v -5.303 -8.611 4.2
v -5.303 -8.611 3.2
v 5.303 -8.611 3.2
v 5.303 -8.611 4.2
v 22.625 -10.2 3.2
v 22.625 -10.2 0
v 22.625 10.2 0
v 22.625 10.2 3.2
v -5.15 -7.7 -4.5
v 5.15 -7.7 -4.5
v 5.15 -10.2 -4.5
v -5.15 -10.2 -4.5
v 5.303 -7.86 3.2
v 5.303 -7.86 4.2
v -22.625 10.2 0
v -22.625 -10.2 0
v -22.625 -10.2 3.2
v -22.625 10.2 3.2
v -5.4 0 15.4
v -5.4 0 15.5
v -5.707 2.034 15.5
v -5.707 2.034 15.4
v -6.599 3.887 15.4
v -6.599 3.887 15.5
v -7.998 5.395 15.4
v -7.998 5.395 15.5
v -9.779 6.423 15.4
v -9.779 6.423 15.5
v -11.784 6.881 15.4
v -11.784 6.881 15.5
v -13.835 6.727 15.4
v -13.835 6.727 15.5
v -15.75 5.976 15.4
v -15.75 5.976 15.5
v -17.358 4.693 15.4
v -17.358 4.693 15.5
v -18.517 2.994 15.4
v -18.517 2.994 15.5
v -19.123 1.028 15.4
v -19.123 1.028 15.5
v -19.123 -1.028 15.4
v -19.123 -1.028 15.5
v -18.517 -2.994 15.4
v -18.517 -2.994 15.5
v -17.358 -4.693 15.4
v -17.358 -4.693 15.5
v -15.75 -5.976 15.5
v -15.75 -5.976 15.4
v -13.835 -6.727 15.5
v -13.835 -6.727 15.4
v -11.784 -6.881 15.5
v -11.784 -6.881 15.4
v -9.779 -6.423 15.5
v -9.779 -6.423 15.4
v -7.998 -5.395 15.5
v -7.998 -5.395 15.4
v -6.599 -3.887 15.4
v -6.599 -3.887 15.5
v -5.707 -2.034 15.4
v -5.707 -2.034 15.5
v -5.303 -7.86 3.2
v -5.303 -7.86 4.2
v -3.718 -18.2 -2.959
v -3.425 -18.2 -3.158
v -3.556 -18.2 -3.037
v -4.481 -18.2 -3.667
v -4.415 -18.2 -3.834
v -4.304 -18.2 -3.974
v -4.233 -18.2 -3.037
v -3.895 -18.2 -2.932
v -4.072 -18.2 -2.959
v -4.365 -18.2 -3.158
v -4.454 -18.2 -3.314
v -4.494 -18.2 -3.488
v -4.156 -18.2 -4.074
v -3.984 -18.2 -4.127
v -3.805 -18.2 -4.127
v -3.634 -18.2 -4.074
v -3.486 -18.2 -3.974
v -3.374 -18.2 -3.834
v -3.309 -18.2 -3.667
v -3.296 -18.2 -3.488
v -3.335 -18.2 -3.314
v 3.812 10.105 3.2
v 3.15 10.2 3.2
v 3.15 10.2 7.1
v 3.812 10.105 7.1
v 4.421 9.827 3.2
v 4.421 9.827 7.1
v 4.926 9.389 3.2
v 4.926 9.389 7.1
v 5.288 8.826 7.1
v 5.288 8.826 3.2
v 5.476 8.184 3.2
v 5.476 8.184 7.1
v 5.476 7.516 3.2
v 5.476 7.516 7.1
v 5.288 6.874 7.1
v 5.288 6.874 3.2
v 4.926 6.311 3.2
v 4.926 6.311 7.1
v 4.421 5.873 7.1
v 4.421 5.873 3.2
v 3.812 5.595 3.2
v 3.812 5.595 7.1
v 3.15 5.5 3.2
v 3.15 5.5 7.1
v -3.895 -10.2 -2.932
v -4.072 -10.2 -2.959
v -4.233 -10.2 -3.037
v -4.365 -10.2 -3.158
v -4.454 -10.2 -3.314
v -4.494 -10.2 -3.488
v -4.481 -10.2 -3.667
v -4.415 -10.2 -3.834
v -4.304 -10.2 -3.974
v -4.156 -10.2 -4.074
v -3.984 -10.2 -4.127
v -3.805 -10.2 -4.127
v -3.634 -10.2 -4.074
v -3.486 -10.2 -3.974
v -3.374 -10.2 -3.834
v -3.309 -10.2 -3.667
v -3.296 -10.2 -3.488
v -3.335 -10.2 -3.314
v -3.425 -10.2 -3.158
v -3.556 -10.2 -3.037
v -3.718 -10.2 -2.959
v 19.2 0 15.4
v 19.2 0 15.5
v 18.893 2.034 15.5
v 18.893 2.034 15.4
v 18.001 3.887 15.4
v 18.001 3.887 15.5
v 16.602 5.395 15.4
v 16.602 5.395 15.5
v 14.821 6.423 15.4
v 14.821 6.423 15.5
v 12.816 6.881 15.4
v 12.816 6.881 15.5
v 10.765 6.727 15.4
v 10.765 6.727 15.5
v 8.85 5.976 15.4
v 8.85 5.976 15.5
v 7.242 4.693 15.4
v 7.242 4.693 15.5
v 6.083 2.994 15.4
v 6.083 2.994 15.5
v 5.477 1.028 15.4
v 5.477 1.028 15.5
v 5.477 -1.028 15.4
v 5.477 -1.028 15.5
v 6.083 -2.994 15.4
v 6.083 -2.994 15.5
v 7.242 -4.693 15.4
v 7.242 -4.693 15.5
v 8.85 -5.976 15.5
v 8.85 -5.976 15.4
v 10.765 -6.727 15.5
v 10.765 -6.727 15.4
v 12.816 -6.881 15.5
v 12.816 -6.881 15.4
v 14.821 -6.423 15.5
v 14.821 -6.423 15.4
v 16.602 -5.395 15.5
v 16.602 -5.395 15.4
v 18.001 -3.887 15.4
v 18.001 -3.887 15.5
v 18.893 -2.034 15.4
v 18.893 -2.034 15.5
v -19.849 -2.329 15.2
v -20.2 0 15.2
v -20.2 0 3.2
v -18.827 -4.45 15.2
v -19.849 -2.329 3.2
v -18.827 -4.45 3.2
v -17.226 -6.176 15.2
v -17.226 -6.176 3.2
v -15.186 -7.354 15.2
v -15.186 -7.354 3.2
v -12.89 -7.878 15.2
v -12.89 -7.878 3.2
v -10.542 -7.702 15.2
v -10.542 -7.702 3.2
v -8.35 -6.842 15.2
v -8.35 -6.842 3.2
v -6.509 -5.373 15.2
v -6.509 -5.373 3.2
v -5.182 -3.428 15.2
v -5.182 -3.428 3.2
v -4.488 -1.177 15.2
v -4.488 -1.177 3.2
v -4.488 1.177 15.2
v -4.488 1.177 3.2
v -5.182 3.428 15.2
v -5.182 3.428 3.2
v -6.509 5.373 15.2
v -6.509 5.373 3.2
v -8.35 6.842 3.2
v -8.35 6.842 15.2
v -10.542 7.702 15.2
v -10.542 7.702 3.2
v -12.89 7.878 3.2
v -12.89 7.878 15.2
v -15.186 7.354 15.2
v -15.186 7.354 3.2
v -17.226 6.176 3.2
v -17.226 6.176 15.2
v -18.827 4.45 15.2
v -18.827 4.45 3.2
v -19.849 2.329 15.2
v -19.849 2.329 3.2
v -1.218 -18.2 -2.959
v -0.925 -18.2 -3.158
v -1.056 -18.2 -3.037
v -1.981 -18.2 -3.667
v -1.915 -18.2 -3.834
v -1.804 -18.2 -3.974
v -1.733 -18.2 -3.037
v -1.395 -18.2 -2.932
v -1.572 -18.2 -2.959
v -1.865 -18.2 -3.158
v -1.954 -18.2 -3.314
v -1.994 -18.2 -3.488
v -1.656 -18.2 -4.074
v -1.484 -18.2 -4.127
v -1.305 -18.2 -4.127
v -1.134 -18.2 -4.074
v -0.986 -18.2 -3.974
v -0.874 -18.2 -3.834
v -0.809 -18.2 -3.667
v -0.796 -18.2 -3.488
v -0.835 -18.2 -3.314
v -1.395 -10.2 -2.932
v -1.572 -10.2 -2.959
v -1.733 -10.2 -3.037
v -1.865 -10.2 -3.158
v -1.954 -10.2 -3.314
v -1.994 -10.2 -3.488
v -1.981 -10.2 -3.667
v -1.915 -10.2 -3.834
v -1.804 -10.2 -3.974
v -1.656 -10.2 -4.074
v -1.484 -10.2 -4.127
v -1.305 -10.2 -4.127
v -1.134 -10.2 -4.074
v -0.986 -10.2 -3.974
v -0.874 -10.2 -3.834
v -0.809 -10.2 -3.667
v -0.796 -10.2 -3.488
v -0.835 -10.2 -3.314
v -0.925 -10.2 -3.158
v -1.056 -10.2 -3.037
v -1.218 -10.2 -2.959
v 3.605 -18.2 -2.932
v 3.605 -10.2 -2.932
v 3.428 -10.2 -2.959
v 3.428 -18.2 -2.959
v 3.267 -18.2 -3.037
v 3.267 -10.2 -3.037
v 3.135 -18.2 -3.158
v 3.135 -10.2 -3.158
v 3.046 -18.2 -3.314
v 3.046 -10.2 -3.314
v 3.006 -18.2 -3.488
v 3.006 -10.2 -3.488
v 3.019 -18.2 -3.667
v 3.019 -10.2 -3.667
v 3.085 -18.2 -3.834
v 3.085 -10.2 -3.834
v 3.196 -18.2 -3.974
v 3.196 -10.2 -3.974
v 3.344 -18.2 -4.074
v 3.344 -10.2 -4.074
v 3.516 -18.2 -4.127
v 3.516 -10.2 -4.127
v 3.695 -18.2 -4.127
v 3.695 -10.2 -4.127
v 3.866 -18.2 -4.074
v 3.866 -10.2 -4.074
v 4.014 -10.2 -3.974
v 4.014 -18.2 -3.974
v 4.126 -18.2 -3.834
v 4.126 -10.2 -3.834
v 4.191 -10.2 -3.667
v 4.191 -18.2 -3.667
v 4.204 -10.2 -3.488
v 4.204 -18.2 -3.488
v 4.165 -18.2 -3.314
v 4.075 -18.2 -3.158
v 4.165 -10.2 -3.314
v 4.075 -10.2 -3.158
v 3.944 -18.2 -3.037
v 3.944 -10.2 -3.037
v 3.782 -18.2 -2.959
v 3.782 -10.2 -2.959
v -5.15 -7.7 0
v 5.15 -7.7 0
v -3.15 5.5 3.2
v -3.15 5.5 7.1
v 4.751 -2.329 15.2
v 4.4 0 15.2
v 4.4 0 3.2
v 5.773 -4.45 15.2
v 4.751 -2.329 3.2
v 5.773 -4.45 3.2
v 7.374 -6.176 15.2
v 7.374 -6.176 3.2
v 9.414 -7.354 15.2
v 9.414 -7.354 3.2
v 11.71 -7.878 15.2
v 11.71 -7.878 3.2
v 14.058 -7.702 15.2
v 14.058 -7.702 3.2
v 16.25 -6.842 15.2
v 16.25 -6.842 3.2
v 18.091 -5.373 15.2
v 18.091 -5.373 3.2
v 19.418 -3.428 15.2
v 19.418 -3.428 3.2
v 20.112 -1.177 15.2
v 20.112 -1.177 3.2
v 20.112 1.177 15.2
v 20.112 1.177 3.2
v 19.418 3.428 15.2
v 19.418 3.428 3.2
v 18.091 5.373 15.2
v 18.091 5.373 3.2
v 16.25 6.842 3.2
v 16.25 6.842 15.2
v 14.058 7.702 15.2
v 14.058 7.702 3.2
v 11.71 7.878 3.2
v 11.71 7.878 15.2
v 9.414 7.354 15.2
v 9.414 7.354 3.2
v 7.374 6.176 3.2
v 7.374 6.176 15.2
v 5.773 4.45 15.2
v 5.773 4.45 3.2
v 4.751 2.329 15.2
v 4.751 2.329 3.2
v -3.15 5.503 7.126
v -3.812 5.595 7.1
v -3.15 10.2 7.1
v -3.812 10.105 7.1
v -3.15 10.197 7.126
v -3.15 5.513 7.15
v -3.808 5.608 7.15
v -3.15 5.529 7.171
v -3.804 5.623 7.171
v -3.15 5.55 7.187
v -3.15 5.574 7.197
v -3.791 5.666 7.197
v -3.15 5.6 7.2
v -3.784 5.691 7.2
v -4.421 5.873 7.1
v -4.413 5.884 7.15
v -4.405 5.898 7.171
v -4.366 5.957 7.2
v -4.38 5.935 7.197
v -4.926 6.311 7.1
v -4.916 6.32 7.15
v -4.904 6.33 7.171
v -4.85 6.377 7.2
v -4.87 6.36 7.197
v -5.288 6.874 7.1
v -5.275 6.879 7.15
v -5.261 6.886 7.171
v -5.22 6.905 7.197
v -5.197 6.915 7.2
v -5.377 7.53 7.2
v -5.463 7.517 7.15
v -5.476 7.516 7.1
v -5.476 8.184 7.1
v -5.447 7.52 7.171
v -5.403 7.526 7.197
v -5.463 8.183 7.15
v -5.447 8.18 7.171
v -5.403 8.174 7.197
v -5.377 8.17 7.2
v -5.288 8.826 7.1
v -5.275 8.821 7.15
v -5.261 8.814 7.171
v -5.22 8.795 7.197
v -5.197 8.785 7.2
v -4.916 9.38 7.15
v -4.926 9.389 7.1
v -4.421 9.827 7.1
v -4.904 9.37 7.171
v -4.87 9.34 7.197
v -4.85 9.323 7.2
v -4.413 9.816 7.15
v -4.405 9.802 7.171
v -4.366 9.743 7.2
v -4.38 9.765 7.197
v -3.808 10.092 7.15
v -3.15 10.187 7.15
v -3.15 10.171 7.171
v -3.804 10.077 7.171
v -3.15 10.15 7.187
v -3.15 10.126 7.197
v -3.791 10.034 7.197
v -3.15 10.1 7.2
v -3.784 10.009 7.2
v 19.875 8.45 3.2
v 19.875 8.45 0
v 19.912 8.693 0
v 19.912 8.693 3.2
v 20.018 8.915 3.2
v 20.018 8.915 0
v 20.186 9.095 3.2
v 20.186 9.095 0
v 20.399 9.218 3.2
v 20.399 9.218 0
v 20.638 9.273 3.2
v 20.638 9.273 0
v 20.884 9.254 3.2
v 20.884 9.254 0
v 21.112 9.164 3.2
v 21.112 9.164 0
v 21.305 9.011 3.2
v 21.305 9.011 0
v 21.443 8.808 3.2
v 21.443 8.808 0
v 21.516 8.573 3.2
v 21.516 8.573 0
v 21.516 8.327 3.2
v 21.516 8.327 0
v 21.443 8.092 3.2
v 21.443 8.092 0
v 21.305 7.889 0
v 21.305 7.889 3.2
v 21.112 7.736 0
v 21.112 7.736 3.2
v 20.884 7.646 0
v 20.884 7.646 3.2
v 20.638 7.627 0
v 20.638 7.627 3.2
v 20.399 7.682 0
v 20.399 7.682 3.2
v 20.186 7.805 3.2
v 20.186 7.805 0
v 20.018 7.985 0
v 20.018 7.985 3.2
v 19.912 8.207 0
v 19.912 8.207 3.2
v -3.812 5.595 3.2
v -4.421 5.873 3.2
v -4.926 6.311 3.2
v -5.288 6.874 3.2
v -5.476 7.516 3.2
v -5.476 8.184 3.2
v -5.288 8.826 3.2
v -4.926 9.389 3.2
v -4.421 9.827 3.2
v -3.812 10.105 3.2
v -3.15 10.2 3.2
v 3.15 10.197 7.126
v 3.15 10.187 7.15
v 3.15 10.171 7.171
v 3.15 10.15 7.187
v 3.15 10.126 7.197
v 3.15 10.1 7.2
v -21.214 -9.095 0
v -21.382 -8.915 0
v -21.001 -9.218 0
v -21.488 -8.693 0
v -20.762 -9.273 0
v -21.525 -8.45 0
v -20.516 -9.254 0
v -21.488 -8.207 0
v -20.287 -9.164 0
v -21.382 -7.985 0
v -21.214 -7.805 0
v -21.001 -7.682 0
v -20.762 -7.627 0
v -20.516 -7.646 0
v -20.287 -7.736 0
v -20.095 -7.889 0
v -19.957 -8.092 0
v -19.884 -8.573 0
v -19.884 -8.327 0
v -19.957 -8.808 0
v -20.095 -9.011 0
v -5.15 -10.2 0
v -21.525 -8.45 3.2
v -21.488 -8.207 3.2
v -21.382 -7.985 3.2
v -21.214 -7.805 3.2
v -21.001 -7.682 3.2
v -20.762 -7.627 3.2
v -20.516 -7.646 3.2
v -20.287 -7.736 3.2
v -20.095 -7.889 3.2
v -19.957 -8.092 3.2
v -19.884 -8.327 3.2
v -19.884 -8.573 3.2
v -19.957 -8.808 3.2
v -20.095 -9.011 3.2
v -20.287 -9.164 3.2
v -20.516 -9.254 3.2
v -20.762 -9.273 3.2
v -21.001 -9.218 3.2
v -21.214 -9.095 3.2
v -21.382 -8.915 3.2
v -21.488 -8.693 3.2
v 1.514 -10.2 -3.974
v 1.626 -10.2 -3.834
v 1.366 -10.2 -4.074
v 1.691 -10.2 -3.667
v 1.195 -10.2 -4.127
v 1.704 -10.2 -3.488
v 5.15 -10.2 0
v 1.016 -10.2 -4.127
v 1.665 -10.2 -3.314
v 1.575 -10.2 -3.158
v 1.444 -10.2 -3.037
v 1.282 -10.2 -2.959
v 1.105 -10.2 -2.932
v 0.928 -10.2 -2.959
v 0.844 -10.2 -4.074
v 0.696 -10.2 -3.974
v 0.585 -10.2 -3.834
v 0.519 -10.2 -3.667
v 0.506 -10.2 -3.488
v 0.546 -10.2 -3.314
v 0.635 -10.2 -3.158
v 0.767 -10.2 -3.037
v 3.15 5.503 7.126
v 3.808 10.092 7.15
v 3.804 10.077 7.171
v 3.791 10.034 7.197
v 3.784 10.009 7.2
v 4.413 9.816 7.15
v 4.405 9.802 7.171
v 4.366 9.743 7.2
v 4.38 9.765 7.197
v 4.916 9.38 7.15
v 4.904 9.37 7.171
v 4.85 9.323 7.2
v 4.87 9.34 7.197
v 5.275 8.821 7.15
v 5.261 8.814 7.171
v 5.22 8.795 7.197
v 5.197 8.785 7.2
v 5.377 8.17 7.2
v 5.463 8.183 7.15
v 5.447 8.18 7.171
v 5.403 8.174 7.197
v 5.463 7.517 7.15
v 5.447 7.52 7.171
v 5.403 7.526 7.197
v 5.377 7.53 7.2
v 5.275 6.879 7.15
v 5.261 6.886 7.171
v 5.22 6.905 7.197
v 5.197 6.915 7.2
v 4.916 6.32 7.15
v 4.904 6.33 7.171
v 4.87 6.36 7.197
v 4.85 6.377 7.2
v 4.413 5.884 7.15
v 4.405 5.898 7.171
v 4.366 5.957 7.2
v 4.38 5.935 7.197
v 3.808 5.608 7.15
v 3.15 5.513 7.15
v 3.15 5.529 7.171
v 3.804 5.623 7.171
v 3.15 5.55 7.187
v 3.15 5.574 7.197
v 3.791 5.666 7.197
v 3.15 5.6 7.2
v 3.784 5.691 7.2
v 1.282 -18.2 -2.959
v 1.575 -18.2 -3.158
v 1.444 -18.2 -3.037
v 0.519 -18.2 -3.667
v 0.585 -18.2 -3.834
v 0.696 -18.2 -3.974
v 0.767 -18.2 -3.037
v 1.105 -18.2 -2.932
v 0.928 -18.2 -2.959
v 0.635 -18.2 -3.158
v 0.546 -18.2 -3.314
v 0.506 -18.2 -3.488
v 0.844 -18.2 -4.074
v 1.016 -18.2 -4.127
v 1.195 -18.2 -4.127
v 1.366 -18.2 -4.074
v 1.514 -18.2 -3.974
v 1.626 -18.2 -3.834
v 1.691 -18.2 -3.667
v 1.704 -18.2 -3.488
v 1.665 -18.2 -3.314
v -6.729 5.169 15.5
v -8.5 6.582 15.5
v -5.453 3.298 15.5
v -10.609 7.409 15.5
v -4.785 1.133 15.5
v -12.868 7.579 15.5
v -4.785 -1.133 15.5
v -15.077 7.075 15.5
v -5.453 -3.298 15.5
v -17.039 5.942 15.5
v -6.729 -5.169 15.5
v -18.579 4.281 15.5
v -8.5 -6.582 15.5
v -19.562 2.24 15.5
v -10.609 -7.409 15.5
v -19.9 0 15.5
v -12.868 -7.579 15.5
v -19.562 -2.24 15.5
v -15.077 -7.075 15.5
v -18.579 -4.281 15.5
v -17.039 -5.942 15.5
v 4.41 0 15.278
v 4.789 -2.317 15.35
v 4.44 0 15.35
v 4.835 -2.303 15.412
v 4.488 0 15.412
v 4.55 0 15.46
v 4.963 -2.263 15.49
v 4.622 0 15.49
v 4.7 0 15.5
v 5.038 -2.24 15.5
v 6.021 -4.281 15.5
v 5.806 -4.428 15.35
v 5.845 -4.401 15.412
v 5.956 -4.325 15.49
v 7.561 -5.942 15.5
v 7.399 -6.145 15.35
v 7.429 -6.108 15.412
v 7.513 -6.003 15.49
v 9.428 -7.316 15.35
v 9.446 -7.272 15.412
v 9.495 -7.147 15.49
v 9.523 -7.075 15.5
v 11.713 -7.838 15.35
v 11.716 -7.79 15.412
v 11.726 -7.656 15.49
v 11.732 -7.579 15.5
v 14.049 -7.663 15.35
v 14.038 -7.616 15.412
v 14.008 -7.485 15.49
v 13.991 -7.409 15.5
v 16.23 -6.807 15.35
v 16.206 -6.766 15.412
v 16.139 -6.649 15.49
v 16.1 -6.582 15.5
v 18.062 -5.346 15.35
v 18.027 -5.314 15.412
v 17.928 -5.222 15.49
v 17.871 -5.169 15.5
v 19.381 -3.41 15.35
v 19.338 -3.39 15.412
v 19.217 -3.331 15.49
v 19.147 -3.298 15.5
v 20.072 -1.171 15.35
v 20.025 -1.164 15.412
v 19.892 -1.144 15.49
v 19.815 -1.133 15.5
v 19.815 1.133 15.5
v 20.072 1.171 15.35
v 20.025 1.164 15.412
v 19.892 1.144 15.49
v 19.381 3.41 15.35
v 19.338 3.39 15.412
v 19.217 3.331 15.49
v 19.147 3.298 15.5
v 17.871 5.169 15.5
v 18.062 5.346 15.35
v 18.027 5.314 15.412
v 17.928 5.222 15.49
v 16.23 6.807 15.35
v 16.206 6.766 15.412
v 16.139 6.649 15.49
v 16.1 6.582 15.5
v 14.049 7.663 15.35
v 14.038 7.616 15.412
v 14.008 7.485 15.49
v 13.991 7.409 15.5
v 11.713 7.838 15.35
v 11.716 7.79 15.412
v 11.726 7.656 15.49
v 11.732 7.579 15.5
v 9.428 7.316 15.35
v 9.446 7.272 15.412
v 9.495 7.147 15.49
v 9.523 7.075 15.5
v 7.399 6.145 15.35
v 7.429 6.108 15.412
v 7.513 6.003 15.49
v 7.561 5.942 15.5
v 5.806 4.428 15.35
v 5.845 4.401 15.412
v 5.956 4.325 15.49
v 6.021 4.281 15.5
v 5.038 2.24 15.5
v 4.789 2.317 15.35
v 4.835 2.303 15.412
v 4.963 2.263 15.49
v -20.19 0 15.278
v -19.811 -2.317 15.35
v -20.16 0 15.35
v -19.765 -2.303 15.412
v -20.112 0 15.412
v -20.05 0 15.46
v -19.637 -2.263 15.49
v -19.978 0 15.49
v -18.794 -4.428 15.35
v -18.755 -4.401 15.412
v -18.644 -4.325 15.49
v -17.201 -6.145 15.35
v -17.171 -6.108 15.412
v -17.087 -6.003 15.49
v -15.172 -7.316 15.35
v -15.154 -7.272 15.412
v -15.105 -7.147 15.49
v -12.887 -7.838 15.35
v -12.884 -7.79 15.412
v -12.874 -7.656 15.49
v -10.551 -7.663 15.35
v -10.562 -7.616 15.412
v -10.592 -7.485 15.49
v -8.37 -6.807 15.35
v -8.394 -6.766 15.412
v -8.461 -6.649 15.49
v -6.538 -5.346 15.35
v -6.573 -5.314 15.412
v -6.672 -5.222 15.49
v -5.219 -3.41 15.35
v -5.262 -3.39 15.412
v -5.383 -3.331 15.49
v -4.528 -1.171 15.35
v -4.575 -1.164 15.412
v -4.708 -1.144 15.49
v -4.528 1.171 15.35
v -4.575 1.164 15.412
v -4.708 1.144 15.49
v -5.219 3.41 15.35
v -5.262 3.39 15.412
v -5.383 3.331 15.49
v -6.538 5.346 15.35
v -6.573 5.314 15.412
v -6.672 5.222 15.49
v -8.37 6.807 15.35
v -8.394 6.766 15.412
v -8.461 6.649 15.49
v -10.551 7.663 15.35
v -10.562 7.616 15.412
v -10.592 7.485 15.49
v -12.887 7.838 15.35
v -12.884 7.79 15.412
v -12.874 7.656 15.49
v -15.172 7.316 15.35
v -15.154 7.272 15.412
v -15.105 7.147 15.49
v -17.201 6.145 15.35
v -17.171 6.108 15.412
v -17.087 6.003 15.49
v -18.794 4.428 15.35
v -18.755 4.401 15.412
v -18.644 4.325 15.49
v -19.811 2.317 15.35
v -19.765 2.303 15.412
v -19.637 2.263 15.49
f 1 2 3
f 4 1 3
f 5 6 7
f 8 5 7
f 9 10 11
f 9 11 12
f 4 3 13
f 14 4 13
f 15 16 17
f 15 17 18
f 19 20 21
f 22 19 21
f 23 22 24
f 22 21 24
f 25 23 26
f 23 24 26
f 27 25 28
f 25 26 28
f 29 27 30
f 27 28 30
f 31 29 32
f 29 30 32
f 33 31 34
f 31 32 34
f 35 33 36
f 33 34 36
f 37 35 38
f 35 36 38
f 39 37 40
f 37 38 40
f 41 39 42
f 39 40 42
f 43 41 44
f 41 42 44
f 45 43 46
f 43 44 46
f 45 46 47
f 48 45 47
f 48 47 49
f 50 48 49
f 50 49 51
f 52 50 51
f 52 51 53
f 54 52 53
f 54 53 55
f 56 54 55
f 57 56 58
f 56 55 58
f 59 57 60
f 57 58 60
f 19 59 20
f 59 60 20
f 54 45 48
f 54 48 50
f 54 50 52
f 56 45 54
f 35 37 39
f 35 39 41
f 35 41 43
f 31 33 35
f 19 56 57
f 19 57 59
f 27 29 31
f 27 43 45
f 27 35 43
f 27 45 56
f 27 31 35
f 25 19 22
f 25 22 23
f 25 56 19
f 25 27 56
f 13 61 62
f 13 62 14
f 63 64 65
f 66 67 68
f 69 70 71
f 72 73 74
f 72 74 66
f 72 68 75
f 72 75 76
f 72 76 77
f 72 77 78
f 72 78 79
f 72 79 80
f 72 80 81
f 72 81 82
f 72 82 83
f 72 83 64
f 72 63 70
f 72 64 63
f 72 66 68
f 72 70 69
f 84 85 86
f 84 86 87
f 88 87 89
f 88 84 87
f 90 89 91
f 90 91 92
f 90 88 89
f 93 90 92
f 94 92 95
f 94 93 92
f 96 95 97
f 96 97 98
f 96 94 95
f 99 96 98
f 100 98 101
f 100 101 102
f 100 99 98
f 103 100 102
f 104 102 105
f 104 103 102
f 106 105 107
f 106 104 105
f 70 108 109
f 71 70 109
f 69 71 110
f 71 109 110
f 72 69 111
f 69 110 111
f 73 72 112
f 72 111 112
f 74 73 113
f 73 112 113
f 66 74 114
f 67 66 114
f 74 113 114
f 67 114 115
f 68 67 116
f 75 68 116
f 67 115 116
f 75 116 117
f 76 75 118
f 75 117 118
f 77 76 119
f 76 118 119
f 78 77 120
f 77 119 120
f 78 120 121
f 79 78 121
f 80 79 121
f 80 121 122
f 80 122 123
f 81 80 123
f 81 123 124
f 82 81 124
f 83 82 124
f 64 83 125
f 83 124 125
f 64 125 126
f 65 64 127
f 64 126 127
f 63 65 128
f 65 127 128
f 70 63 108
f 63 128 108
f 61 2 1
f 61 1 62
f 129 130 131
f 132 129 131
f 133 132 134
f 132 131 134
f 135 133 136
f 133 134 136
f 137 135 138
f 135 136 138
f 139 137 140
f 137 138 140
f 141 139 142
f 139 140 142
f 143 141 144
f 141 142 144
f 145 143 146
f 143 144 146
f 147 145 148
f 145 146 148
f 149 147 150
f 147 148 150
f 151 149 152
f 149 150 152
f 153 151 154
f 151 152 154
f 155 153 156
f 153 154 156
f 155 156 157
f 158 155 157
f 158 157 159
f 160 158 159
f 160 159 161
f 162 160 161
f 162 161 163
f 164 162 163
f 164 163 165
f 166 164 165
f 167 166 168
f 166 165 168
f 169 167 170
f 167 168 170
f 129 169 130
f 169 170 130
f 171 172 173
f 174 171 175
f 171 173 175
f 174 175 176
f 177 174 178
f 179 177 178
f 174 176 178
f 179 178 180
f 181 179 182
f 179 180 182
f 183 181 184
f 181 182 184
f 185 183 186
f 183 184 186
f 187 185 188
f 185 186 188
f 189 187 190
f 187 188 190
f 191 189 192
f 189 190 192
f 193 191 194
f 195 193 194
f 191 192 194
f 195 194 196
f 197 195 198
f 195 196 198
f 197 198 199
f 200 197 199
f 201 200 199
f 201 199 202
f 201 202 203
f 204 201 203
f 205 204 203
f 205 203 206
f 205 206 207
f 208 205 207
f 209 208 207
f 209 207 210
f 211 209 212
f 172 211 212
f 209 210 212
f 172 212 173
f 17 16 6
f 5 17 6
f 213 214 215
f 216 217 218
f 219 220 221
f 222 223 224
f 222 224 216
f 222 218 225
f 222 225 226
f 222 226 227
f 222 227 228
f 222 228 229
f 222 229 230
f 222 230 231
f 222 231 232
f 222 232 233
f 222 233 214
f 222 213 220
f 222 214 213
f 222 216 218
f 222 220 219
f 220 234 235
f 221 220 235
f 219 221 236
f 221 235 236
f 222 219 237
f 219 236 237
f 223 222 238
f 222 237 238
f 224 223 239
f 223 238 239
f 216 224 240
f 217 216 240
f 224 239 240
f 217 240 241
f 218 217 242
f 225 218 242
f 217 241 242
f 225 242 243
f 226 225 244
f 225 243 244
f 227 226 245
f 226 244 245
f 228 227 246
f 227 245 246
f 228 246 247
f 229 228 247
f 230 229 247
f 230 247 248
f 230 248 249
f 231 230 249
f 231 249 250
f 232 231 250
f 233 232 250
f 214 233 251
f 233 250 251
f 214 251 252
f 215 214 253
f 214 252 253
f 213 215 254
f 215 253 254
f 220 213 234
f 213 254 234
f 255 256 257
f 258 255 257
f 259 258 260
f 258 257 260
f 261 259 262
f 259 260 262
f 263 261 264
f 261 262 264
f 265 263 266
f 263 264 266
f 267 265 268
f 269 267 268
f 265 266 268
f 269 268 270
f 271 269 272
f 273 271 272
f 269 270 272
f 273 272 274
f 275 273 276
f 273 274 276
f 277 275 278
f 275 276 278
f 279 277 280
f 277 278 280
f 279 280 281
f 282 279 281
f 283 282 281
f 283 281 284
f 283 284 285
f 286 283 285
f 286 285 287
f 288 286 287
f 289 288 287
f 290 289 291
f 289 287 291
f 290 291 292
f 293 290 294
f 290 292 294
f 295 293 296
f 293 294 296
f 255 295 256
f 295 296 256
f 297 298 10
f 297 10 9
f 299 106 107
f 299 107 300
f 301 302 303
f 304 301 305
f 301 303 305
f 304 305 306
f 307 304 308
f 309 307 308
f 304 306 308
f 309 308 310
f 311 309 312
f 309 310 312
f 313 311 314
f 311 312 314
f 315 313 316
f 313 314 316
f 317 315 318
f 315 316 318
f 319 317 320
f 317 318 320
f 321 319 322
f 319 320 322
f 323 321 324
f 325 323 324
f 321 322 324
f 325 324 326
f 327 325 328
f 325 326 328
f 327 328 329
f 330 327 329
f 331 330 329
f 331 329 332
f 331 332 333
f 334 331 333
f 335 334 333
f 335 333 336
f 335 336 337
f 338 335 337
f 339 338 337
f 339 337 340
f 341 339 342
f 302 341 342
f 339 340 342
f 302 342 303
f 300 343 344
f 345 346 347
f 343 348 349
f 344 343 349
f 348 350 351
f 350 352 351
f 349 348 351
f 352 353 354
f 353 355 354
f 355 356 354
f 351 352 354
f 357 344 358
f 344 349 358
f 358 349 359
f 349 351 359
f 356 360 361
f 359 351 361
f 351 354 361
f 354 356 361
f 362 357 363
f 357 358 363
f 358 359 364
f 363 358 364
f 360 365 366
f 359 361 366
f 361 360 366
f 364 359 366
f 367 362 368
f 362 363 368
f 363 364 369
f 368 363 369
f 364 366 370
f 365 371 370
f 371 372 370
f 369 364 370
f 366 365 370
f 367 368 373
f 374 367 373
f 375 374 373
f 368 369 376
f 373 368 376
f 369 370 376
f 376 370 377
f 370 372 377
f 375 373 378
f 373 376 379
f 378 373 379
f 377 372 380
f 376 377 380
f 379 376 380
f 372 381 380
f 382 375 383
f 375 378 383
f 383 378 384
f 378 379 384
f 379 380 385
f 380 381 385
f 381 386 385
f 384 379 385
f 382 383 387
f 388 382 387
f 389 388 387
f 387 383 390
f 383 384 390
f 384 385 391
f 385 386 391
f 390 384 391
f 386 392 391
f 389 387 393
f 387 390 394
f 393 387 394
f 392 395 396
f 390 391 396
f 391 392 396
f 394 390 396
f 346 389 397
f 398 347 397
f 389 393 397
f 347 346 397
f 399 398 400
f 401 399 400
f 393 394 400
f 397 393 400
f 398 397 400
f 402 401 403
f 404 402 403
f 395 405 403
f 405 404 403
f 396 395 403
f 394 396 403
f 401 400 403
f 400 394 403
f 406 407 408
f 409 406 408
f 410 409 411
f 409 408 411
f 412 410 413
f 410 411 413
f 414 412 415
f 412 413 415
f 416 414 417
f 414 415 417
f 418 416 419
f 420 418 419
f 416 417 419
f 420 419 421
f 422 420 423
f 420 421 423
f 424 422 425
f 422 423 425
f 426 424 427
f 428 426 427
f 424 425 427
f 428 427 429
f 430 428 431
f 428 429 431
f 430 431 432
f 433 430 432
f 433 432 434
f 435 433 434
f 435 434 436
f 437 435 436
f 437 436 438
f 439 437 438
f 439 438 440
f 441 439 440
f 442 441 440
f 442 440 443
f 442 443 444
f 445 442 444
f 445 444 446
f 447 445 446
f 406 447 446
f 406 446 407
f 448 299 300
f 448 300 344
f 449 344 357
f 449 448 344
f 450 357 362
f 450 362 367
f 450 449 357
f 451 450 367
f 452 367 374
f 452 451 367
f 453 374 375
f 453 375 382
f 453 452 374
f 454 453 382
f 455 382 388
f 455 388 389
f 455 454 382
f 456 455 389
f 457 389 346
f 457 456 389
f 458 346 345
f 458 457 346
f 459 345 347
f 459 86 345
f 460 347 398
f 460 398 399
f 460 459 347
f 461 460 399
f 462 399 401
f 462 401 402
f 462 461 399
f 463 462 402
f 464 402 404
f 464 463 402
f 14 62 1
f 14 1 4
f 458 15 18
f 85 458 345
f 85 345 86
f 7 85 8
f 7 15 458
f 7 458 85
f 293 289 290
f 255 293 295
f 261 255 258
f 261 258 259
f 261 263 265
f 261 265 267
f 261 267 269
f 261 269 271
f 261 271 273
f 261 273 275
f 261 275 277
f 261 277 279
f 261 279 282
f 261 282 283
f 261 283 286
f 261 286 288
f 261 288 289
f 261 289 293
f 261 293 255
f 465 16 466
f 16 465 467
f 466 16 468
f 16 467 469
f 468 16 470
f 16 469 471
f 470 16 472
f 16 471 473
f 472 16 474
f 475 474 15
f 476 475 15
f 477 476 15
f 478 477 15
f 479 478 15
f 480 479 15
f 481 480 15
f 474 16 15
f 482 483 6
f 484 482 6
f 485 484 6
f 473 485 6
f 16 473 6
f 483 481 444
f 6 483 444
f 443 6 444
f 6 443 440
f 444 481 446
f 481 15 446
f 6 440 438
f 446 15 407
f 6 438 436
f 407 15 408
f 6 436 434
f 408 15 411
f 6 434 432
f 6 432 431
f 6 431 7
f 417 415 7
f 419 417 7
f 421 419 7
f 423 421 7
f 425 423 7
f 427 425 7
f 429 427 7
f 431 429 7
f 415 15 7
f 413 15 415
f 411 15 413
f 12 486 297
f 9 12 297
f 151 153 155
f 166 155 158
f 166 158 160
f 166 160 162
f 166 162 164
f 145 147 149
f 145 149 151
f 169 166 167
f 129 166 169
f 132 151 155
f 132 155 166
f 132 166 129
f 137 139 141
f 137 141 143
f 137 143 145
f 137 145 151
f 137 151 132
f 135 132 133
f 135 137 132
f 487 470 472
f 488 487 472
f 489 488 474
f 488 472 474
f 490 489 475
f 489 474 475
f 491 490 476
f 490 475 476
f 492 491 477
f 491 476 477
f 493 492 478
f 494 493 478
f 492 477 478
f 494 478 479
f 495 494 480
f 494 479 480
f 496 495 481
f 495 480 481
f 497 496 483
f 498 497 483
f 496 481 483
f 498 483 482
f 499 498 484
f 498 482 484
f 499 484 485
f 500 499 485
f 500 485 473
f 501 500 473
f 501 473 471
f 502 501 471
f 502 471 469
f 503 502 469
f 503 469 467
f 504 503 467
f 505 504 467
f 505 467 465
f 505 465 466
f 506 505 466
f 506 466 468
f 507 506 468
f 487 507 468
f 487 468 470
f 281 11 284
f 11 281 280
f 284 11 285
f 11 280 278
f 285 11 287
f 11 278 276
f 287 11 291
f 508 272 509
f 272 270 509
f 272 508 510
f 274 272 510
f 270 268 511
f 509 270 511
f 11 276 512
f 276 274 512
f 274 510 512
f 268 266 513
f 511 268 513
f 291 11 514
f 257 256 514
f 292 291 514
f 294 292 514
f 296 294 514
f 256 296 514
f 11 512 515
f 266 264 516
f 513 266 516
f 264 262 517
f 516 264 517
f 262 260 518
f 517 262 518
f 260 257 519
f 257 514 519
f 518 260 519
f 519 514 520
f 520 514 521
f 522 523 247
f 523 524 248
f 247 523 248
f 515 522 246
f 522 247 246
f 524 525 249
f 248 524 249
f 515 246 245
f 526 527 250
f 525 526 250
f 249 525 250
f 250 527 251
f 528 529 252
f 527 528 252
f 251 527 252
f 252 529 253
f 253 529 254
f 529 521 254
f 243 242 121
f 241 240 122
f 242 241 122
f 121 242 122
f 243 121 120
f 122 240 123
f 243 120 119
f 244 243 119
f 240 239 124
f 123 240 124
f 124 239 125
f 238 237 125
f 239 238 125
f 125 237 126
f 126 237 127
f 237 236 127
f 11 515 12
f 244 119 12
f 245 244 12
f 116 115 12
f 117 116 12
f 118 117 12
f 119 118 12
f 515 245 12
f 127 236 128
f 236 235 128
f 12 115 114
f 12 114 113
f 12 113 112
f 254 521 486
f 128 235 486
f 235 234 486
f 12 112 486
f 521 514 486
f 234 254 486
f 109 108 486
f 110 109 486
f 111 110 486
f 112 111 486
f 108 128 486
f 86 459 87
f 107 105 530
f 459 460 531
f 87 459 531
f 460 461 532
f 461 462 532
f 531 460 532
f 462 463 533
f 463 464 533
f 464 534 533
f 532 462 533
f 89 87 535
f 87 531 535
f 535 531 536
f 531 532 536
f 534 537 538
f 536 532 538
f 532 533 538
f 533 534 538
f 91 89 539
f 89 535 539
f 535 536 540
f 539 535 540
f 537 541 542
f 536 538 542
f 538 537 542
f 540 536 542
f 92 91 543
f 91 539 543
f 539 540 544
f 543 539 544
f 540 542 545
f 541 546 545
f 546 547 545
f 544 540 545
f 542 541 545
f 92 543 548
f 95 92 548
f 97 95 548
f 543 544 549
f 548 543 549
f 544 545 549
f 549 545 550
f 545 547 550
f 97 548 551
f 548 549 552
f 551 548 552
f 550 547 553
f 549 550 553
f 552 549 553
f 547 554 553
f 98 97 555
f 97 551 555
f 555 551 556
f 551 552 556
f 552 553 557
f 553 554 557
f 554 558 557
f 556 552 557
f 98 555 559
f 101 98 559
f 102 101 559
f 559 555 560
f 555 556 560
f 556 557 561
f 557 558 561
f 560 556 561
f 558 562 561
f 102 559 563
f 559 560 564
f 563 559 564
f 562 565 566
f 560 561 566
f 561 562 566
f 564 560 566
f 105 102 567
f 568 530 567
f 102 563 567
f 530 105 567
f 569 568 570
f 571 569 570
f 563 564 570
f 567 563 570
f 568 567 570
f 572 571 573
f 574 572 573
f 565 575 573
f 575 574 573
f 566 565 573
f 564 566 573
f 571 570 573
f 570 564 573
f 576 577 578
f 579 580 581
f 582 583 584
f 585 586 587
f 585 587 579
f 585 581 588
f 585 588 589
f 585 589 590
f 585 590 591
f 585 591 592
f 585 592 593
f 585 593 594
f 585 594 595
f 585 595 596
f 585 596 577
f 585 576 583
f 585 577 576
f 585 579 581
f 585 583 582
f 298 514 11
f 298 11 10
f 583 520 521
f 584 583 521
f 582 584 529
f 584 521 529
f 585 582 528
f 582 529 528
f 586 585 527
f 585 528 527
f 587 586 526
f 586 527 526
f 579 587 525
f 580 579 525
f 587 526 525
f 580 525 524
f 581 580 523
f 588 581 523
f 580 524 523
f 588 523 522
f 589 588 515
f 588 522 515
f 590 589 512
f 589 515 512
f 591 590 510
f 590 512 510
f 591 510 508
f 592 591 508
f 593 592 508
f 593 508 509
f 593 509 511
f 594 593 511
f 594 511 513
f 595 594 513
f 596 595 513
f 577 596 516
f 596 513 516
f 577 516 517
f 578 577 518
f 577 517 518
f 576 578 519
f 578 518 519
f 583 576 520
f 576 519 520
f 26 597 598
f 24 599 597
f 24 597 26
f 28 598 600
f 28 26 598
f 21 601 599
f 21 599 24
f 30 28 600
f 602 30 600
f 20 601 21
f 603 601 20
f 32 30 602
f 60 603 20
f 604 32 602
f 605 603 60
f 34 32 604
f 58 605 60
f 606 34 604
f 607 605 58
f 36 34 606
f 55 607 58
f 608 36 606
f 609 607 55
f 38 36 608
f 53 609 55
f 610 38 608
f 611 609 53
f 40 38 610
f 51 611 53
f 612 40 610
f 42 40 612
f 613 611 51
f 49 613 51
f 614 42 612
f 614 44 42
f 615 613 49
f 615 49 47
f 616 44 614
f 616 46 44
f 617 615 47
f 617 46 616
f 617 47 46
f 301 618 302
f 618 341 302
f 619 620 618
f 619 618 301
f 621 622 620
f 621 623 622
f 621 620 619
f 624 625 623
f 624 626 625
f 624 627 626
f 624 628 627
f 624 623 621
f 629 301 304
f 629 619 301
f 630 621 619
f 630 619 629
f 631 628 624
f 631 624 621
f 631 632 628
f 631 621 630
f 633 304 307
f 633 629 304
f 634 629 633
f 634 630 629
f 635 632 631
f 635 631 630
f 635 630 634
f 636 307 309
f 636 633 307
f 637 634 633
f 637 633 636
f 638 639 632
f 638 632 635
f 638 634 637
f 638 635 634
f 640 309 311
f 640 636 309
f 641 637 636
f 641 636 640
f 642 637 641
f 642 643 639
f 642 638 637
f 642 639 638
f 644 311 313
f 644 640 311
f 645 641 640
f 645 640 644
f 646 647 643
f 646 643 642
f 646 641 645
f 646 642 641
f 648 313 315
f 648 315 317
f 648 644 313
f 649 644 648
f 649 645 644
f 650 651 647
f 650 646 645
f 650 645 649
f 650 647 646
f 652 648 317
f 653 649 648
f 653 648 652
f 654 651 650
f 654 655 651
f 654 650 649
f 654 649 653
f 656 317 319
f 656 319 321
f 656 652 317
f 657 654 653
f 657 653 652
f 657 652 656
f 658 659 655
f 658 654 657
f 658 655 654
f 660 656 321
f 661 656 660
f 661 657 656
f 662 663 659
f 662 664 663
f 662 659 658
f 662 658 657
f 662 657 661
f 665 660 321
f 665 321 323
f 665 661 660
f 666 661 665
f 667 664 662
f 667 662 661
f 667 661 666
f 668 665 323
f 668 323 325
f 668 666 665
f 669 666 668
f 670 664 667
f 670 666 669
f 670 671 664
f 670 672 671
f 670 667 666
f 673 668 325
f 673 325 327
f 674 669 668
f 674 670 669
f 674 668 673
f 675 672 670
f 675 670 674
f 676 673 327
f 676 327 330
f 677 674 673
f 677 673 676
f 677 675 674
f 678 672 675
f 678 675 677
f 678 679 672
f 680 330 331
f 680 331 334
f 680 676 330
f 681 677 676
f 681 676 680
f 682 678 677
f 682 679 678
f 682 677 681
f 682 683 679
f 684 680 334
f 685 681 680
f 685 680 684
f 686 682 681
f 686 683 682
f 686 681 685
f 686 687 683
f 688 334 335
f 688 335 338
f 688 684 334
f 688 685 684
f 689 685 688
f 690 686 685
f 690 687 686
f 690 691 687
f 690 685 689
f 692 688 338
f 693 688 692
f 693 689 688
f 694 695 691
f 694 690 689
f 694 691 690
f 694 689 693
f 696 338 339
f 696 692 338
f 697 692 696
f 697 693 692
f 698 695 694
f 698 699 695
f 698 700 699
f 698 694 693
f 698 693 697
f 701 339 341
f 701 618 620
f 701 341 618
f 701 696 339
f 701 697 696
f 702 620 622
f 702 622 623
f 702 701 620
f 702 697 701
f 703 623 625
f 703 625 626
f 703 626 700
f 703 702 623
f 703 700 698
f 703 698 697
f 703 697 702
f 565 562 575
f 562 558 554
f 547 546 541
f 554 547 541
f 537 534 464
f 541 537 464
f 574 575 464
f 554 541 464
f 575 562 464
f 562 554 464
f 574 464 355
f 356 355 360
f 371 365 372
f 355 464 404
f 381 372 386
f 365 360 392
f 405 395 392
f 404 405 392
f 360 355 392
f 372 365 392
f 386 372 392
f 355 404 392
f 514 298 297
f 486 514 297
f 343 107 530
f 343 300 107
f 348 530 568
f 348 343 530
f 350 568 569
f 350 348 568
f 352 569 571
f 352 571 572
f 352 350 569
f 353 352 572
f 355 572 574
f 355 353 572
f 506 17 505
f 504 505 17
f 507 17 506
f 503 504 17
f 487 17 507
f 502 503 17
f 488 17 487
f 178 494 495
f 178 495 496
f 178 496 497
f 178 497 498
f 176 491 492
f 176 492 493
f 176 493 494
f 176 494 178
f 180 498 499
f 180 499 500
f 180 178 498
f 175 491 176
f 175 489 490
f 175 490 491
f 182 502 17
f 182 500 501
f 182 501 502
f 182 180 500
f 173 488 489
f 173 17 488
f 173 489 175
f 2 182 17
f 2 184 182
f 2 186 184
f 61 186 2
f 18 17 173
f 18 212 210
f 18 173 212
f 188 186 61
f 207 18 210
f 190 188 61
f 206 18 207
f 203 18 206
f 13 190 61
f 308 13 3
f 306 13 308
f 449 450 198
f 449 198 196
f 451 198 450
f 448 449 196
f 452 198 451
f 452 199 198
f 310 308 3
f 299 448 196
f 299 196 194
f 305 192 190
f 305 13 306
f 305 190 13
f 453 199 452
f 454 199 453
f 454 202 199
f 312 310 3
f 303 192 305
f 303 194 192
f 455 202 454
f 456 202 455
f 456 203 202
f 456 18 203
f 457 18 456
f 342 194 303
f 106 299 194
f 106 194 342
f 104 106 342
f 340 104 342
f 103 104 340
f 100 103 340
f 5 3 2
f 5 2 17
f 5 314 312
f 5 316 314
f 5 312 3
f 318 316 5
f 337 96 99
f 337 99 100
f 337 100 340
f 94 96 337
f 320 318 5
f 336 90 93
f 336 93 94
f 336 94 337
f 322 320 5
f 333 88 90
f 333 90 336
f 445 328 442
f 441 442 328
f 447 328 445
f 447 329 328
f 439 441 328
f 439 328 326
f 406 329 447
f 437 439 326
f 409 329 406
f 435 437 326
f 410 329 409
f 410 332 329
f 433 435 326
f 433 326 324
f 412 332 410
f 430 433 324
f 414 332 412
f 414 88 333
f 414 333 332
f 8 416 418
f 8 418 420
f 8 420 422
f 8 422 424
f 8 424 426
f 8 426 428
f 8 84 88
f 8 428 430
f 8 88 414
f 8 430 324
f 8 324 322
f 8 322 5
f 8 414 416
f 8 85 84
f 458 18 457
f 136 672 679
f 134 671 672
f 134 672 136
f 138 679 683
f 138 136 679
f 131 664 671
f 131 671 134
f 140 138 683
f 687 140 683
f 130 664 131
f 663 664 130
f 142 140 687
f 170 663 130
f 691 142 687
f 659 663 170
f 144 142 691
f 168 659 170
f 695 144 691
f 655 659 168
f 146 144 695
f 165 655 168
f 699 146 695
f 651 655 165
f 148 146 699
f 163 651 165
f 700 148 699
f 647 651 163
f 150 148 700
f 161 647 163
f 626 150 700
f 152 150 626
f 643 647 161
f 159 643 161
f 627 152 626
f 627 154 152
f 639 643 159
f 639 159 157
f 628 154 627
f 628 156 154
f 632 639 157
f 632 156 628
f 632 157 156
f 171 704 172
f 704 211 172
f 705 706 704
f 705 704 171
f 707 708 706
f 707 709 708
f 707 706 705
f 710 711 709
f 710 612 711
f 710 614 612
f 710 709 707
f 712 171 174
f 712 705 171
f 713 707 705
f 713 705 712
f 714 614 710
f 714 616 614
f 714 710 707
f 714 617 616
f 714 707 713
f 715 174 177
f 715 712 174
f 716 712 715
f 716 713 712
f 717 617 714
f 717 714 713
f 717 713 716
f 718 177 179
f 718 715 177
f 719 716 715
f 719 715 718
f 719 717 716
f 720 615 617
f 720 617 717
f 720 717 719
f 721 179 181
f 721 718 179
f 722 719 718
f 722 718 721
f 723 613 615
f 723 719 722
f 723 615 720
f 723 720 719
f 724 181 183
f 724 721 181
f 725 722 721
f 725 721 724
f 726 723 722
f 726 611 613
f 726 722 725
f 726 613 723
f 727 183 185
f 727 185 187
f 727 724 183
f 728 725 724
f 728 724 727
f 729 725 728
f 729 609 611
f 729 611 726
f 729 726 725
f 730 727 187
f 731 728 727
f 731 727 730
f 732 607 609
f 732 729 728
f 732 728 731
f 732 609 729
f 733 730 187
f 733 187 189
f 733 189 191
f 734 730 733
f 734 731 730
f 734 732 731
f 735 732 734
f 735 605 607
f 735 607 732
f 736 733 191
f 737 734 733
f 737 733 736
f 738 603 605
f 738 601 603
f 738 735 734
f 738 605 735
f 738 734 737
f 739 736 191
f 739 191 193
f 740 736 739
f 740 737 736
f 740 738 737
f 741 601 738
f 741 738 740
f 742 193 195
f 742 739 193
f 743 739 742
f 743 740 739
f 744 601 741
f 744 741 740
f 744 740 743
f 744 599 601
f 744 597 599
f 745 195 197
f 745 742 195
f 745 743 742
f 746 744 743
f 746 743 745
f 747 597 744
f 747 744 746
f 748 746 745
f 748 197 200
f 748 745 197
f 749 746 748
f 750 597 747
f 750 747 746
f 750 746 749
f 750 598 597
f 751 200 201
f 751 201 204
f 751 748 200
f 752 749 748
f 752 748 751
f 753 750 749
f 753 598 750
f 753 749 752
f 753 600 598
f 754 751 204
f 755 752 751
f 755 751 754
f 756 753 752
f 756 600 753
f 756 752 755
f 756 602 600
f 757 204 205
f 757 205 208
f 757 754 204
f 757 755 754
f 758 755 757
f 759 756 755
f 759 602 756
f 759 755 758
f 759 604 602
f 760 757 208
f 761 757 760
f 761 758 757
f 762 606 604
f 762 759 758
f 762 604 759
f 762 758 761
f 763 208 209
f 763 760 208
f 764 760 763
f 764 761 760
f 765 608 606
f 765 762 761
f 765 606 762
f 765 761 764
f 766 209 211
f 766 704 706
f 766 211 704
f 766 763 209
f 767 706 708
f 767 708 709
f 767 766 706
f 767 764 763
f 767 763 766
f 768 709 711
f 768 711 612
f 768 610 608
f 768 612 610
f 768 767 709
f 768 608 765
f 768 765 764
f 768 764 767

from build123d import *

# Parameters (mm, degrees)
SKETCH_1_W          = 45.25
SKETCH_1_H          = 20.4
EXTRUDE_1_DEPTH     = 3.2
EXTRUDE_2_DEPTH     = 4
FILLET_1_R          = 0.1
SKETCH_3_R          = 7.9
EXTRUDE_3_DEPTH     = 12.3
SKETCH_4_R          = 6.9
CUT_EXTRUDE_1_DEPTH = 0.1
FILLET_2_R          = 0.3
SKETCH_5_W          = 10.605065306
SKETCH_5_H          = 0.750801084
EXTRUDE_4_DEPTH     = 1
SKETCH_6_W          = 10.3
SKETCH_6_H          = 2.5
EXTRUDE_5_DEPTH     = 4.5
SKETCH_7_R          = 0.600934077
EXTRUDE_6_DEPTH     = 8
SKETCH_8_R          = 0.825
CUT_EXTRUDE_2_DEPTH = 10


with BuildPart() as part:
    # Эскиз1 → Бобышка-Вытянуть1 (new body)
    with BuildSketch(Plane.XY):
        Rectangle(SKETCH_1_W, SKETCH_1_H)
    extrude(amount=EXTRUDE_1_DEPTH)

    # Эскиз2 → Бобышка-Вытянуть2 (add)
    with BuildSketch(Plane.XY.offset(3.2)):
        with BuildLine():
            Line((-3.15, 10.2), (3.15, 10.2))
            ThreePointArc((3.15, 10.2), (5.5, 7.85), (3.15, 5.5))
            Line((3.15, 5.5), (-3.15, 5.5))
            ThreePointArc((-3.15, 5.5), (-5.5, 7.85), (-3.15, 10.2))
        make_face()
    extrude(amount=EXTRUDE_2_DEPTH)

    # Скругление1
    fillet_1_edges = [part.edges().sort_by_distance(p)[0] for p in [
        (-5.5, 7.85, 7.2),
        (0, 5.5, 7.2),
        (5.5, 7.85, 7.2),
        (0, 10.2, 7.2),
    ]]
    fillet(fillet_1_edges, radius=FILLET_1_R)

    # Эскиз3 → Бобышка-Вытянуть3 (add)
    with BuildSketch(Plane.XY.offset(3.2)):
        with Locations(Location((-12.3, 0, 0), (0, 0, 180))):
            Circle(SKETCH_3_R)
        with Locations(Location((12.3, 0, 0), (0, 0, 180))):
            Circle(SKETCH_3_R)
    extrude(amount=EXTRUDE_3_DEPTH)

    # Эскиз4 → Вырез-Вытянуть1 (cut)
    with BuildSketch(Plane.XY.offset(15.5)):
        with Locations((-12.3, 0)):
            Circle(SKETCH_4_R)
        with Locations((12.3, 0)):
            Circle(SKETCH_4_R)
    extrude(amount=-CUT_EXTRUDE_1_DEPTH, mode=Mode.SUBTRACT)

    # Скругление2
    fillet_2_edges = [part.edges().sort_by_distance(p)[0] for p in [
        (-4.4, 0, 15.5),
        (20.2, 0, 15.5),
    ]]
    fillet(fillet_2_edges, radius=FILLET_2_R)

    # Эскиз5 → Бобышка-Вытянуть4 (add)
    with BuildSketch(Plane.XY.offset(3.2)):
        with Locations((0, -8.235349386)):
            Rectangle(SKETCH_5_W, SKETCH_5_H)
    extrude(amount=EXTRUDE_4_DEPTH)

    # Эскиз8 → Вырез-Вытянуть2 (cut)
    with BuildSketch(Plane(origin=(0, 0, 0), x_dir=(-1, 0, 0), z_dir=(0, 0, -1))):
        with Locations((-20.7, 8.45)):
            Circle(SKETCH_8_R)
        with Locations((20.7, -8.45)):
            Circle(SKETCH_8_R)
    extrude(amount=-CUT_EXTRUDE_2_DEPTH, mode=Mode.SUBTRACT)


with BuildPart() as body_2:
    # Эскиз6 → Бобышка-Вытянуть5 (new body)
    with BuildSketch(Plane(origin=(0, 0, 0), x_dir=(-1, 0, 0), z_dir=(0, 0, -1))):
        with Locations((0, -8.95)):
            Rectangle(SKETCH_6_W, SKETCH_6_H)
    extrude(amount=EXTRUDE_5_DEPTH)

    # Эскиз7 → Бобышка-Вытянуть6 (add)
    with BuildSketch(Plane.XZ.offset(10.2)):
        with Locations(Location((-3.894780621, -3.533075537, 0), (0, 0, 90))):
            Circle(SKETCH_7_R)
        with Locations(Location((-1.394780621, -3.533075537, 0), (0, 0, 90))):
            Circle(SKETCH_7_R)
        with Locations(Location((1.105219379, -3.533075537, 0), (0, 0, 90))):
            Circle(SKETCH_7_R)
        with Locations(Location((3.605219379, -3.533075537, 0), (0, 0, 90))):
            Circle(SKETCH_7_R)
    extrude(amount=EXTRUDE_6_DEPTH)


solid = Compound([part.part, body_2.part])
